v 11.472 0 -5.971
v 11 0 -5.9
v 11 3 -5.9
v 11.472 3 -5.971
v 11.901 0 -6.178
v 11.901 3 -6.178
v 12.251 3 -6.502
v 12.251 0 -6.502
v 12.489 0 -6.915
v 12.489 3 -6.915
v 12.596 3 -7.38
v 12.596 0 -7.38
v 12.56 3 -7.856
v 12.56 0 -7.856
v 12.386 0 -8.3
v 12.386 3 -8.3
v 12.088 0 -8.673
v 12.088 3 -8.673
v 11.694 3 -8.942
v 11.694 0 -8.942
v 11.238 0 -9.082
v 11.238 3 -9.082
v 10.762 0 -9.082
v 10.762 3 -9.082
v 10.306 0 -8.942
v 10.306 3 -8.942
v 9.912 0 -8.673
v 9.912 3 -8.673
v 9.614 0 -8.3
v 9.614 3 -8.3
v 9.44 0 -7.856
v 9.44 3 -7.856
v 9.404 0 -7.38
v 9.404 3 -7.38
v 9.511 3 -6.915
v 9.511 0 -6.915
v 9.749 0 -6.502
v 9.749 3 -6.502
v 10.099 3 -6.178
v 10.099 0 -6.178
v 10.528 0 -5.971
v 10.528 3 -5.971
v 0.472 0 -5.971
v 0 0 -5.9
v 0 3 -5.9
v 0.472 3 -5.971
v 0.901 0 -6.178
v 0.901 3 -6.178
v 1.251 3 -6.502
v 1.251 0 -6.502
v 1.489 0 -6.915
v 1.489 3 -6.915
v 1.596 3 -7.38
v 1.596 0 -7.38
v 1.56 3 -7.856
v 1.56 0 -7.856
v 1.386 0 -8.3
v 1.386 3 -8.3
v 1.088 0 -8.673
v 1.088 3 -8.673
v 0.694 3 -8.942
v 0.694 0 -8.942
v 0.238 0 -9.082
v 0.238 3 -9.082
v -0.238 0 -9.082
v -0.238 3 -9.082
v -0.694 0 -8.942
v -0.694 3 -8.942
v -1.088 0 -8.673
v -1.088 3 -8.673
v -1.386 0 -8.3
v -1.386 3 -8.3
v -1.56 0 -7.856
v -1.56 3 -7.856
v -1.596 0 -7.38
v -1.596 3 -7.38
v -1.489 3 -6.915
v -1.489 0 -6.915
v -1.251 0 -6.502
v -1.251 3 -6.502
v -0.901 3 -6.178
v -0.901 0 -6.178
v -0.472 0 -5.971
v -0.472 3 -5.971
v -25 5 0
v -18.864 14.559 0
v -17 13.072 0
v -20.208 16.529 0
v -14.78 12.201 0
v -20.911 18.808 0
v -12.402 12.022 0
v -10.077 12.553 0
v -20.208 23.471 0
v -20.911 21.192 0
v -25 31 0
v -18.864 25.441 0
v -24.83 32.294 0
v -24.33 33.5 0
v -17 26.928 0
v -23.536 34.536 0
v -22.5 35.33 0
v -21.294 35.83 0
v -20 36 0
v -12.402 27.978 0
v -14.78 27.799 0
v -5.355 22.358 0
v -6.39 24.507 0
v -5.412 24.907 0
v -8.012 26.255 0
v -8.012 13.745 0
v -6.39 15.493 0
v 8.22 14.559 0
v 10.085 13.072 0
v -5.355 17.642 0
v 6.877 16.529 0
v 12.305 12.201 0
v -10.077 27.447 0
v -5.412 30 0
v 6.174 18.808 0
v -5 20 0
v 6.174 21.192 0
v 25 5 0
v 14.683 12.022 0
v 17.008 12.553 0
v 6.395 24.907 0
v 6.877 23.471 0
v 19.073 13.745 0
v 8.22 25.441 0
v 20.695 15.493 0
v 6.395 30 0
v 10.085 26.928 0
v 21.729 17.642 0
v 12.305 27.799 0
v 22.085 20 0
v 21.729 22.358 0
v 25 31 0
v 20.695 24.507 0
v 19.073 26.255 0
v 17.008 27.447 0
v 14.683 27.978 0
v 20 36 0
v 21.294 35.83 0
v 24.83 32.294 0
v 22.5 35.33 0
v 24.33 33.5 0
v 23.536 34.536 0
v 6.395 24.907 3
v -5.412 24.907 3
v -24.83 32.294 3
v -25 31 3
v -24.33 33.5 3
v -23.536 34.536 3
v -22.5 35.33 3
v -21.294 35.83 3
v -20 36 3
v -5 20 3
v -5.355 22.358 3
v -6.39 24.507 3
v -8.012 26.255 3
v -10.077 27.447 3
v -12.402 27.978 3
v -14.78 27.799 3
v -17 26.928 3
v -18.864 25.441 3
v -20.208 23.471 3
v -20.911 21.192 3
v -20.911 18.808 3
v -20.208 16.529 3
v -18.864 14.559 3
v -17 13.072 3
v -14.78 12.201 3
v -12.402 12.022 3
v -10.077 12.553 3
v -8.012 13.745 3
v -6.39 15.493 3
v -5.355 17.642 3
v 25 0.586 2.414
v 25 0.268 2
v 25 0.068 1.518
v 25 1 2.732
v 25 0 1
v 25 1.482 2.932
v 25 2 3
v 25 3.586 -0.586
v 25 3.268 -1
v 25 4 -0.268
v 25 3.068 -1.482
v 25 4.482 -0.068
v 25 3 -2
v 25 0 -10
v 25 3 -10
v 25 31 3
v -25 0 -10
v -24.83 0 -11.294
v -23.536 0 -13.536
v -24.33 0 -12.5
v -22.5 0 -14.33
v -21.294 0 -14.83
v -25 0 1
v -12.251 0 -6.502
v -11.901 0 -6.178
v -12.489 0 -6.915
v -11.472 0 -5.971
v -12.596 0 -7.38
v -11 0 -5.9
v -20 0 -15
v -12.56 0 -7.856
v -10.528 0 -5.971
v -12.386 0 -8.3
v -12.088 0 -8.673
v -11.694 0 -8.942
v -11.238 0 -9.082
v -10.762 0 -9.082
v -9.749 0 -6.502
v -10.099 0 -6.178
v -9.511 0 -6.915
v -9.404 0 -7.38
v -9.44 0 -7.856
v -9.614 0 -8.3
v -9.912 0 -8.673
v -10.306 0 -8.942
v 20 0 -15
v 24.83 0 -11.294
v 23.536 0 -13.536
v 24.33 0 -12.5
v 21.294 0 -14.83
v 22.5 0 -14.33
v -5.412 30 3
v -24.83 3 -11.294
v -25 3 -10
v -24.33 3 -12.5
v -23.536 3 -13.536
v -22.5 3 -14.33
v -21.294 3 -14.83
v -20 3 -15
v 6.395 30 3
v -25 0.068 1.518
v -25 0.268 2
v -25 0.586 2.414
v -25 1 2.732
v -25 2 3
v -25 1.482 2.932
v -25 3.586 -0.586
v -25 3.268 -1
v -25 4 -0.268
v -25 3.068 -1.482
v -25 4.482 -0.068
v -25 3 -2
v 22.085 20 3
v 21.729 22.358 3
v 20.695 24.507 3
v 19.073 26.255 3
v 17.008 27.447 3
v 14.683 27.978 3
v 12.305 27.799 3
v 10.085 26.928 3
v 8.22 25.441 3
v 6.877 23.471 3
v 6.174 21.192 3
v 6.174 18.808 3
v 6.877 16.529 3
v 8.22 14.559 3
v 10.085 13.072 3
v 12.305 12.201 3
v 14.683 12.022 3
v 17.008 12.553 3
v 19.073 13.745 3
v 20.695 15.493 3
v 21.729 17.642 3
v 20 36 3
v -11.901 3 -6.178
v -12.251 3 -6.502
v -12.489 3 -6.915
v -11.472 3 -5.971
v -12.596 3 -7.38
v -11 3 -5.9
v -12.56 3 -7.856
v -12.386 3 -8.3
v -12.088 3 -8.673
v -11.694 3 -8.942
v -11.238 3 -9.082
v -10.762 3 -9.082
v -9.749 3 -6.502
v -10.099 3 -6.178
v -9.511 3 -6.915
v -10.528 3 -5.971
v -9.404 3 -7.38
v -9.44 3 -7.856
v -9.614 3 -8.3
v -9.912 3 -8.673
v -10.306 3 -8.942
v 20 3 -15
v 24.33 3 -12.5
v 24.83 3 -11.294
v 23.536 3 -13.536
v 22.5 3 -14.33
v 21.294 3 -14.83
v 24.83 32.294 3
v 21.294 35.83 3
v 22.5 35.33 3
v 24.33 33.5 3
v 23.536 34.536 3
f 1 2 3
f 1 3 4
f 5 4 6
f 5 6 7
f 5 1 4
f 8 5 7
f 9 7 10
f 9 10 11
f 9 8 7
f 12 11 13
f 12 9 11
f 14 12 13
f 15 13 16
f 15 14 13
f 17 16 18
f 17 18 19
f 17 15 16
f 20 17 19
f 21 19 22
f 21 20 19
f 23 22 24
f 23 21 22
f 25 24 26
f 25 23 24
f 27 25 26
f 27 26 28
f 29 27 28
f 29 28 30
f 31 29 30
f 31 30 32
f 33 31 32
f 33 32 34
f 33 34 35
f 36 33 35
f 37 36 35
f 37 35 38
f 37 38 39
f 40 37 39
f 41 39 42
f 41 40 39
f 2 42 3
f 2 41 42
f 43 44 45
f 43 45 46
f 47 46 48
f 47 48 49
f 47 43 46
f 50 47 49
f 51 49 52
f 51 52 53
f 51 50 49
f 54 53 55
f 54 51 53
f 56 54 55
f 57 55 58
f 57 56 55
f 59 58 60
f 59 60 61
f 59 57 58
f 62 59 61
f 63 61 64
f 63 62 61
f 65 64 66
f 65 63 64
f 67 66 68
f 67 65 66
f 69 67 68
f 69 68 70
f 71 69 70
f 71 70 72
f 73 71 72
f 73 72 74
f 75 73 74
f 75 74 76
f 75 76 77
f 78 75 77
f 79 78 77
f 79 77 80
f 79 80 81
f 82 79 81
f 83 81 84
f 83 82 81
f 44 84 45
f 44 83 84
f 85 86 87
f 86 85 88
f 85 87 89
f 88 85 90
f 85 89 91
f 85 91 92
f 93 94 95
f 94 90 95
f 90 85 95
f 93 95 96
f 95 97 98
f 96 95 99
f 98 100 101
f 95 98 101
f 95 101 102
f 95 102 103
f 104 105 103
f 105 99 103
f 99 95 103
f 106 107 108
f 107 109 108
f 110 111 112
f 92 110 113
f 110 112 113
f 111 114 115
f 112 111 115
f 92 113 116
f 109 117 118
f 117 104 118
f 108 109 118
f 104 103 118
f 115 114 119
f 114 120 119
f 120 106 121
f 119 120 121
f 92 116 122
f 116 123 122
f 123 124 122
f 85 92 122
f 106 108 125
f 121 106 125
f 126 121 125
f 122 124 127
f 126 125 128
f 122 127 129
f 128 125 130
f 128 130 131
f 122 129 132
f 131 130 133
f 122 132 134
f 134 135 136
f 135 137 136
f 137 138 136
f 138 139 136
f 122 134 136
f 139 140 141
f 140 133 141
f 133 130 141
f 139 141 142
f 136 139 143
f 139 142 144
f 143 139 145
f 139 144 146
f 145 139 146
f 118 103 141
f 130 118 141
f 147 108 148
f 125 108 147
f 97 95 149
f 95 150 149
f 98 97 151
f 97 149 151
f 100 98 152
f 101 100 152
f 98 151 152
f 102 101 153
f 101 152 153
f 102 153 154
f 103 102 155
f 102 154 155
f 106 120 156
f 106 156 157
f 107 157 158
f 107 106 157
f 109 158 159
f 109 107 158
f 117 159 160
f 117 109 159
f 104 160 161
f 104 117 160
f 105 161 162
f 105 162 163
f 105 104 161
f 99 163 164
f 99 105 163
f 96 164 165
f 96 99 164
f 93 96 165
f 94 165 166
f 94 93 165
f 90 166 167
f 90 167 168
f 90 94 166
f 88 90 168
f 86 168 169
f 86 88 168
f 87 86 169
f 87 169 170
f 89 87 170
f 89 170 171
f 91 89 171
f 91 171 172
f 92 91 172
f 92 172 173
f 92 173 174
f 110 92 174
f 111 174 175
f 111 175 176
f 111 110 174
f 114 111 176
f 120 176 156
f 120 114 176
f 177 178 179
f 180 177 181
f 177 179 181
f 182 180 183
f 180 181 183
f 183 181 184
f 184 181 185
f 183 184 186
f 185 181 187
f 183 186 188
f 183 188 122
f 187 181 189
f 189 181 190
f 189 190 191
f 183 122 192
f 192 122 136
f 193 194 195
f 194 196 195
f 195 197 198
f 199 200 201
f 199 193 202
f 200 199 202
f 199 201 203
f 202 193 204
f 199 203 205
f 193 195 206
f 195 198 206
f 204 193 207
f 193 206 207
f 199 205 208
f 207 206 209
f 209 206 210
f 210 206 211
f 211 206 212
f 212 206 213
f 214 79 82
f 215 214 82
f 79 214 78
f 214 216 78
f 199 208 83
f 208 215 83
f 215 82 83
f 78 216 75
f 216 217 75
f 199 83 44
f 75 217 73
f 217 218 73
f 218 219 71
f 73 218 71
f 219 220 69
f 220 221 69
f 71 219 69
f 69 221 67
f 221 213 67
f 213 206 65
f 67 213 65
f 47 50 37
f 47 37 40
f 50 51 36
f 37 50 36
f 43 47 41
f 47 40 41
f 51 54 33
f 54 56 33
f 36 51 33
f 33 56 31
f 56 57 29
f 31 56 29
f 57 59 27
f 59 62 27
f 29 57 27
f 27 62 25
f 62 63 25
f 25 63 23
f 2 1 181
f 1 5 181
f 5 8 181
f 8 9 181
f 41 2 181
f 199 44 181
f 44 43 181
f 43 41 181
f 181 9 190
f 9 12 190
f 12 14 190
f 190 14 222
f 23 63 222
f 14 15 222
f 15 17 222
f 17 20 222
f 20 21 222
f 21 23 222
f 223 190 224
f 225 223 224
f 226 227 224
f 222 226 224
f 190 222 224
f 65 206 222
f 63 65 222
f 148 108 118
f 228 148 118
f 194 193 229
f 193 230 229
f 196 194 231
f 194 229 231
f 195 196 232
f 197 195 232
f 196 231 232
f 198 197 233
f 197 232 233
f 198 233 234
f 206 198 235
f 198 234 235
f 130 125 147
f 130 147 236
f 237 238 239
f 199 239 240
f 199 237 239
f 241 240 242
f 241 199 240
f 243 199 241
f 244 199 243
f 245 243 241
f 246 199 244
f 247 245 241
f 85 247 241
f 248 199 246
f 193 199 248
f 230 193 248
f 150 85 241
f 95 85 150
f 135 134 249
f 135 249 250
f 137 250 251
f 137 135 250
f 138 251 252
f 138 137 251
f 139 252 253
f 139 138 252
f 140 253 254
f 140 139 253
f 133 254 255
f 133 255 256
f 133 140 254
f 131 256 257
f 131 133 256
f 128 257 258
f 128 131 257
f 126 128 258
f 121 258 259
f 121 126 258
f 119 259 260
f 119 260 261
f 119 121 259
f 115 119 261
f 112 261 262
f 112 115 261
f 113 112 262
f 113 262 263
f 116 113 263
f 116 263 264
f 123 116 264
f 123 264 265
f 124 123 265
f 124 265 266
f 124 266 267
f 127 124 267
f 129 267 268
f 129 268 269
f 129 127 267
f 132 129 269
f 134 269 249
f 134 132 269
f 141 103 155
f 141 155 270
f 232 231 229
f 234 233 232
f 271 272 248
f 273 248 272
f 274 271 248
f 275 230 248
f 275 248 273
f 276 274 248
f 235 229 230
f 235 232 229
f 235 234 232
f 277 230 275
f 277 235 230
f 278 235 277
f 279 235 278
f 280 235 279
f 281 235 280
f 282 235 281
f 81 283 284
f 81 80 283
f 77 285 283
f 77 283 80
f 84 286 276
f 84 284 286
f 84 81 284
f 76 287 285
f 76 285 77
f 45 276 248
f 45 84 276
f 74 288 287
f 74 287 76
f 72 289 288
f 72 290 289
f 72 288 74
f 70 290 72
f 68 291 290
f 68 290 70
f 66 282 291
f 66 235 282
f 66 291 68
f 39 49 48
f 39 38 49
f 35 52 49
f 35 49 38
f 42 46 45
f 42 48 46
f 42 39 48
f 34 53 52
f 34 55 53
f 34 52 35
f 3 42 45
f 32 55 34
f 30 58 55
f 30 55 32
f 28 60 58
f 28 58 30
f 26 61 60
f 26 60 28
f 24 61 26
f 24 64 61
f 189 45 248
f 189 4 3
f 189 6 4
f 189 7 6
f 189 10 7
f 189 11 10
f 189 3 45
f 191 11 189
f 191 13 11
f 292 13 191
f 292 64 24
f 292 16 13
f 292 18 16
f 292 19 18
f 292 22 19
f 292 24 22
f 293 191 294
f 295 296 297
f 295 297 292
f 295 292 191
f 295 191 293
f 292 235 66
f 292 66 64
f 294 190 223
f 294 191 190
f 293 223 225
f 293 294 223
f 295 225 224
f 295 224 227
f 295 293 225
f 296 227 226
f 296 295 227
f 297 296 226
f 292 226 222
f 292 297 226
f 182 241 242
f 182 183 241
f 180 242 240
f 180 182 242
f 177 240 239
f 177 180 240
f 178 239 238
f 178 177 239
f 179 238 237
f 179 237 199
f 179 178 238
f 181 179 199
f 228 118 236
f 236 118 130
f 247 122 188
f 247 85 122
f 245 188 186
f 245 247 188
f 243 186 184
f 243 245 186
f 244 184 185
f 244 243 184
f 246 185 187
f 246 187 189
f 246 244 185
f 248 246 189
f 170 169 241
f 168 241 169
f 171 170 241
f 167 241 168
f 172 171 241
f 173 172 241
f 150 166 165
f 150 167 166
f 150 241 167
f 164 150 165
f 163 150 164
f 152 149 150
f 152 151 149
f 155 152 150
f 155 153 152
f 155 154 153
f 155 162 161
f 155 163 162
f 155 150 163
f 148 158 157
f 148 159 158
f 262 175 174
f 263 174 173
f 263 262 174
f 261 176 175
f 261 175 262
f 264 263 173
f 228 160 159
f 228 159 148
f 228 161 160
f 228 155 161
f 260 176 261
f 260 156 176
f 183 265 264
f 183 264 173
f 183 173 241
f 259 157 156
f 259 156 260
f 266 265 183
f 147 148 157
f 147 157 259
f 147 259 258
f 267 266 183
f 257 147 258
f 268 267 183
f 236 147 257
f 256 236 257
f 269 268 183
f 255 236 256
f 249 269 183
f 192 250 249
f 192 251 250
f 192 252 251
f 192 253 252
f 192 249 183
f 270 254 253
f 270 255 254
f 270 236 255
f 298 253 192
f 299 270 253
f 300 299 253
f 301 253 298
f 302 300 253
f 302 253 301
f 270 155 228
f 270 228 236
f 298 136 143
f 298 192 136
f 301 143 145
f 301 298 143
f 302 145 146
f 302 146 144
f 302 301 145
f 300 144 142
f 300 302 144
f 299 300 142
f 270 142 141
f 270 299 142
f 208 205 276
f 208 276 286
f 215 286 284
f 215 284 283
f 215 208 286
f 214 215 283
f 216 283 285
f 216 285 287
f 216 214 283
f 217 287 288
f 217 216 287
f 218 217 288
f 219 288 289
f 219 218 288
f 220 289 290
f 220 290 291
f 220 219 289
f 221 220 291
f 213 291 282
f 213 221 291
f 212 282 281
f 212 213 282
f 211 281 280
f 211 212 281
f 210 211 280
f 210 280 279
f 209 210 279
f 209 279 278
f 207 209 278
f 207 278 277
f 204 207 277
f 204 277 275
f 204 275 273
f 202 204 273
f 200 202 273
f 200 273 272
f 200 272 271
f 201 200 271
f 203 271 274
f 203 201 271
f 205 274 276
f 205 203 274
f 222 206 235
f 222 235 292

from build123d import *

# Parameters (mm, degrees)
SKETCH1_W           = 50
SKETCH1_H           = 36
SKETCH1_R           = 8
SKETCH1_W_2         = 11.807071599
SKETCH1_H_2         = 5.093325141
BOSS_EXTRUDE1_DEPTH = 3
SKETCH2_W           = 50
SKETCH2_H           = 18
SKETCH2_R           = 1.6
BOSS_EXTRUDE2_DEPTH = 3
FILLET1_R           = 5
FILLET2_R           = 2


with BuildPart() as part:
    # Sketch1 → Boss-Extrude1 (new body)
    with BuildSketch(Plane.XY):
        with Locations((0, 18)):
            Rectangle(SKETCH1_W, SKETCH1_H)
        with Locations((-13, 20)):
            Circle(SKETCH1_R, mode=Mode.SUBTRACT)
        with Locations((14.084852814, 20)):
            Circle(SKETCH1_R, mode=Mode.SUBTRACT)
        with Locations((0.491645941, 27.45333743)):
            Rectangle(SKETCH1_W_2, SKETCH1_H_2, mode=Mode.SUBTRACT)
    extrude(amount=BOSS_EXTRUDE1_DEPTH)

    # Sketch2 → Boss-Extrude2 (add)
    with BuildSketch(Plane(origin=(0, 0, 0), x_dir=(1, 0, 0), z_dir=(0, 1, 0))):
        with Locations((0, 6)):
            Rectangle(SKETCH2_W, SKETCH2_H)
        with Locations(Location((0, 7.5, 0), (0, 0, 270))):
            Circle(SKETCH2_R, mode=Mode.SUBTRACT)
        with Locations(Location((-11, 7.5, 0), (0, 0, 270))):
            Circle(SKETCH2_R, mode=Mode.SUBTRACT)
        with Locations(Location((11, 7.5, 0), (0, 0, 270))):
            Circle(SKETCH2_R, mode=Mode.SUBTRACT)
    extrude(amount=BOSS_EXTRUDE2_DEPTH)

    # Fillet1
    fillet1_edges = [part.edges().sort_by_distance(p)[0] for p in [
        (-25, 1.5, -15),
        (25, 1.5, -15),
        (-25, 36, 1.5),
        (25, 36, 1.5),
    ]]
    fillet(fillet1_edges, radius=FILLET1_R)

    # Fillet2
    fillet2_edges = [part.edges().sort_by_distance(p)[0] for p in [
        (0, 3, 0),
        (0, 0, 3),
    ]]
    fillet(fillet2_edges, radius=FILLET2_R)


solid = part.part
